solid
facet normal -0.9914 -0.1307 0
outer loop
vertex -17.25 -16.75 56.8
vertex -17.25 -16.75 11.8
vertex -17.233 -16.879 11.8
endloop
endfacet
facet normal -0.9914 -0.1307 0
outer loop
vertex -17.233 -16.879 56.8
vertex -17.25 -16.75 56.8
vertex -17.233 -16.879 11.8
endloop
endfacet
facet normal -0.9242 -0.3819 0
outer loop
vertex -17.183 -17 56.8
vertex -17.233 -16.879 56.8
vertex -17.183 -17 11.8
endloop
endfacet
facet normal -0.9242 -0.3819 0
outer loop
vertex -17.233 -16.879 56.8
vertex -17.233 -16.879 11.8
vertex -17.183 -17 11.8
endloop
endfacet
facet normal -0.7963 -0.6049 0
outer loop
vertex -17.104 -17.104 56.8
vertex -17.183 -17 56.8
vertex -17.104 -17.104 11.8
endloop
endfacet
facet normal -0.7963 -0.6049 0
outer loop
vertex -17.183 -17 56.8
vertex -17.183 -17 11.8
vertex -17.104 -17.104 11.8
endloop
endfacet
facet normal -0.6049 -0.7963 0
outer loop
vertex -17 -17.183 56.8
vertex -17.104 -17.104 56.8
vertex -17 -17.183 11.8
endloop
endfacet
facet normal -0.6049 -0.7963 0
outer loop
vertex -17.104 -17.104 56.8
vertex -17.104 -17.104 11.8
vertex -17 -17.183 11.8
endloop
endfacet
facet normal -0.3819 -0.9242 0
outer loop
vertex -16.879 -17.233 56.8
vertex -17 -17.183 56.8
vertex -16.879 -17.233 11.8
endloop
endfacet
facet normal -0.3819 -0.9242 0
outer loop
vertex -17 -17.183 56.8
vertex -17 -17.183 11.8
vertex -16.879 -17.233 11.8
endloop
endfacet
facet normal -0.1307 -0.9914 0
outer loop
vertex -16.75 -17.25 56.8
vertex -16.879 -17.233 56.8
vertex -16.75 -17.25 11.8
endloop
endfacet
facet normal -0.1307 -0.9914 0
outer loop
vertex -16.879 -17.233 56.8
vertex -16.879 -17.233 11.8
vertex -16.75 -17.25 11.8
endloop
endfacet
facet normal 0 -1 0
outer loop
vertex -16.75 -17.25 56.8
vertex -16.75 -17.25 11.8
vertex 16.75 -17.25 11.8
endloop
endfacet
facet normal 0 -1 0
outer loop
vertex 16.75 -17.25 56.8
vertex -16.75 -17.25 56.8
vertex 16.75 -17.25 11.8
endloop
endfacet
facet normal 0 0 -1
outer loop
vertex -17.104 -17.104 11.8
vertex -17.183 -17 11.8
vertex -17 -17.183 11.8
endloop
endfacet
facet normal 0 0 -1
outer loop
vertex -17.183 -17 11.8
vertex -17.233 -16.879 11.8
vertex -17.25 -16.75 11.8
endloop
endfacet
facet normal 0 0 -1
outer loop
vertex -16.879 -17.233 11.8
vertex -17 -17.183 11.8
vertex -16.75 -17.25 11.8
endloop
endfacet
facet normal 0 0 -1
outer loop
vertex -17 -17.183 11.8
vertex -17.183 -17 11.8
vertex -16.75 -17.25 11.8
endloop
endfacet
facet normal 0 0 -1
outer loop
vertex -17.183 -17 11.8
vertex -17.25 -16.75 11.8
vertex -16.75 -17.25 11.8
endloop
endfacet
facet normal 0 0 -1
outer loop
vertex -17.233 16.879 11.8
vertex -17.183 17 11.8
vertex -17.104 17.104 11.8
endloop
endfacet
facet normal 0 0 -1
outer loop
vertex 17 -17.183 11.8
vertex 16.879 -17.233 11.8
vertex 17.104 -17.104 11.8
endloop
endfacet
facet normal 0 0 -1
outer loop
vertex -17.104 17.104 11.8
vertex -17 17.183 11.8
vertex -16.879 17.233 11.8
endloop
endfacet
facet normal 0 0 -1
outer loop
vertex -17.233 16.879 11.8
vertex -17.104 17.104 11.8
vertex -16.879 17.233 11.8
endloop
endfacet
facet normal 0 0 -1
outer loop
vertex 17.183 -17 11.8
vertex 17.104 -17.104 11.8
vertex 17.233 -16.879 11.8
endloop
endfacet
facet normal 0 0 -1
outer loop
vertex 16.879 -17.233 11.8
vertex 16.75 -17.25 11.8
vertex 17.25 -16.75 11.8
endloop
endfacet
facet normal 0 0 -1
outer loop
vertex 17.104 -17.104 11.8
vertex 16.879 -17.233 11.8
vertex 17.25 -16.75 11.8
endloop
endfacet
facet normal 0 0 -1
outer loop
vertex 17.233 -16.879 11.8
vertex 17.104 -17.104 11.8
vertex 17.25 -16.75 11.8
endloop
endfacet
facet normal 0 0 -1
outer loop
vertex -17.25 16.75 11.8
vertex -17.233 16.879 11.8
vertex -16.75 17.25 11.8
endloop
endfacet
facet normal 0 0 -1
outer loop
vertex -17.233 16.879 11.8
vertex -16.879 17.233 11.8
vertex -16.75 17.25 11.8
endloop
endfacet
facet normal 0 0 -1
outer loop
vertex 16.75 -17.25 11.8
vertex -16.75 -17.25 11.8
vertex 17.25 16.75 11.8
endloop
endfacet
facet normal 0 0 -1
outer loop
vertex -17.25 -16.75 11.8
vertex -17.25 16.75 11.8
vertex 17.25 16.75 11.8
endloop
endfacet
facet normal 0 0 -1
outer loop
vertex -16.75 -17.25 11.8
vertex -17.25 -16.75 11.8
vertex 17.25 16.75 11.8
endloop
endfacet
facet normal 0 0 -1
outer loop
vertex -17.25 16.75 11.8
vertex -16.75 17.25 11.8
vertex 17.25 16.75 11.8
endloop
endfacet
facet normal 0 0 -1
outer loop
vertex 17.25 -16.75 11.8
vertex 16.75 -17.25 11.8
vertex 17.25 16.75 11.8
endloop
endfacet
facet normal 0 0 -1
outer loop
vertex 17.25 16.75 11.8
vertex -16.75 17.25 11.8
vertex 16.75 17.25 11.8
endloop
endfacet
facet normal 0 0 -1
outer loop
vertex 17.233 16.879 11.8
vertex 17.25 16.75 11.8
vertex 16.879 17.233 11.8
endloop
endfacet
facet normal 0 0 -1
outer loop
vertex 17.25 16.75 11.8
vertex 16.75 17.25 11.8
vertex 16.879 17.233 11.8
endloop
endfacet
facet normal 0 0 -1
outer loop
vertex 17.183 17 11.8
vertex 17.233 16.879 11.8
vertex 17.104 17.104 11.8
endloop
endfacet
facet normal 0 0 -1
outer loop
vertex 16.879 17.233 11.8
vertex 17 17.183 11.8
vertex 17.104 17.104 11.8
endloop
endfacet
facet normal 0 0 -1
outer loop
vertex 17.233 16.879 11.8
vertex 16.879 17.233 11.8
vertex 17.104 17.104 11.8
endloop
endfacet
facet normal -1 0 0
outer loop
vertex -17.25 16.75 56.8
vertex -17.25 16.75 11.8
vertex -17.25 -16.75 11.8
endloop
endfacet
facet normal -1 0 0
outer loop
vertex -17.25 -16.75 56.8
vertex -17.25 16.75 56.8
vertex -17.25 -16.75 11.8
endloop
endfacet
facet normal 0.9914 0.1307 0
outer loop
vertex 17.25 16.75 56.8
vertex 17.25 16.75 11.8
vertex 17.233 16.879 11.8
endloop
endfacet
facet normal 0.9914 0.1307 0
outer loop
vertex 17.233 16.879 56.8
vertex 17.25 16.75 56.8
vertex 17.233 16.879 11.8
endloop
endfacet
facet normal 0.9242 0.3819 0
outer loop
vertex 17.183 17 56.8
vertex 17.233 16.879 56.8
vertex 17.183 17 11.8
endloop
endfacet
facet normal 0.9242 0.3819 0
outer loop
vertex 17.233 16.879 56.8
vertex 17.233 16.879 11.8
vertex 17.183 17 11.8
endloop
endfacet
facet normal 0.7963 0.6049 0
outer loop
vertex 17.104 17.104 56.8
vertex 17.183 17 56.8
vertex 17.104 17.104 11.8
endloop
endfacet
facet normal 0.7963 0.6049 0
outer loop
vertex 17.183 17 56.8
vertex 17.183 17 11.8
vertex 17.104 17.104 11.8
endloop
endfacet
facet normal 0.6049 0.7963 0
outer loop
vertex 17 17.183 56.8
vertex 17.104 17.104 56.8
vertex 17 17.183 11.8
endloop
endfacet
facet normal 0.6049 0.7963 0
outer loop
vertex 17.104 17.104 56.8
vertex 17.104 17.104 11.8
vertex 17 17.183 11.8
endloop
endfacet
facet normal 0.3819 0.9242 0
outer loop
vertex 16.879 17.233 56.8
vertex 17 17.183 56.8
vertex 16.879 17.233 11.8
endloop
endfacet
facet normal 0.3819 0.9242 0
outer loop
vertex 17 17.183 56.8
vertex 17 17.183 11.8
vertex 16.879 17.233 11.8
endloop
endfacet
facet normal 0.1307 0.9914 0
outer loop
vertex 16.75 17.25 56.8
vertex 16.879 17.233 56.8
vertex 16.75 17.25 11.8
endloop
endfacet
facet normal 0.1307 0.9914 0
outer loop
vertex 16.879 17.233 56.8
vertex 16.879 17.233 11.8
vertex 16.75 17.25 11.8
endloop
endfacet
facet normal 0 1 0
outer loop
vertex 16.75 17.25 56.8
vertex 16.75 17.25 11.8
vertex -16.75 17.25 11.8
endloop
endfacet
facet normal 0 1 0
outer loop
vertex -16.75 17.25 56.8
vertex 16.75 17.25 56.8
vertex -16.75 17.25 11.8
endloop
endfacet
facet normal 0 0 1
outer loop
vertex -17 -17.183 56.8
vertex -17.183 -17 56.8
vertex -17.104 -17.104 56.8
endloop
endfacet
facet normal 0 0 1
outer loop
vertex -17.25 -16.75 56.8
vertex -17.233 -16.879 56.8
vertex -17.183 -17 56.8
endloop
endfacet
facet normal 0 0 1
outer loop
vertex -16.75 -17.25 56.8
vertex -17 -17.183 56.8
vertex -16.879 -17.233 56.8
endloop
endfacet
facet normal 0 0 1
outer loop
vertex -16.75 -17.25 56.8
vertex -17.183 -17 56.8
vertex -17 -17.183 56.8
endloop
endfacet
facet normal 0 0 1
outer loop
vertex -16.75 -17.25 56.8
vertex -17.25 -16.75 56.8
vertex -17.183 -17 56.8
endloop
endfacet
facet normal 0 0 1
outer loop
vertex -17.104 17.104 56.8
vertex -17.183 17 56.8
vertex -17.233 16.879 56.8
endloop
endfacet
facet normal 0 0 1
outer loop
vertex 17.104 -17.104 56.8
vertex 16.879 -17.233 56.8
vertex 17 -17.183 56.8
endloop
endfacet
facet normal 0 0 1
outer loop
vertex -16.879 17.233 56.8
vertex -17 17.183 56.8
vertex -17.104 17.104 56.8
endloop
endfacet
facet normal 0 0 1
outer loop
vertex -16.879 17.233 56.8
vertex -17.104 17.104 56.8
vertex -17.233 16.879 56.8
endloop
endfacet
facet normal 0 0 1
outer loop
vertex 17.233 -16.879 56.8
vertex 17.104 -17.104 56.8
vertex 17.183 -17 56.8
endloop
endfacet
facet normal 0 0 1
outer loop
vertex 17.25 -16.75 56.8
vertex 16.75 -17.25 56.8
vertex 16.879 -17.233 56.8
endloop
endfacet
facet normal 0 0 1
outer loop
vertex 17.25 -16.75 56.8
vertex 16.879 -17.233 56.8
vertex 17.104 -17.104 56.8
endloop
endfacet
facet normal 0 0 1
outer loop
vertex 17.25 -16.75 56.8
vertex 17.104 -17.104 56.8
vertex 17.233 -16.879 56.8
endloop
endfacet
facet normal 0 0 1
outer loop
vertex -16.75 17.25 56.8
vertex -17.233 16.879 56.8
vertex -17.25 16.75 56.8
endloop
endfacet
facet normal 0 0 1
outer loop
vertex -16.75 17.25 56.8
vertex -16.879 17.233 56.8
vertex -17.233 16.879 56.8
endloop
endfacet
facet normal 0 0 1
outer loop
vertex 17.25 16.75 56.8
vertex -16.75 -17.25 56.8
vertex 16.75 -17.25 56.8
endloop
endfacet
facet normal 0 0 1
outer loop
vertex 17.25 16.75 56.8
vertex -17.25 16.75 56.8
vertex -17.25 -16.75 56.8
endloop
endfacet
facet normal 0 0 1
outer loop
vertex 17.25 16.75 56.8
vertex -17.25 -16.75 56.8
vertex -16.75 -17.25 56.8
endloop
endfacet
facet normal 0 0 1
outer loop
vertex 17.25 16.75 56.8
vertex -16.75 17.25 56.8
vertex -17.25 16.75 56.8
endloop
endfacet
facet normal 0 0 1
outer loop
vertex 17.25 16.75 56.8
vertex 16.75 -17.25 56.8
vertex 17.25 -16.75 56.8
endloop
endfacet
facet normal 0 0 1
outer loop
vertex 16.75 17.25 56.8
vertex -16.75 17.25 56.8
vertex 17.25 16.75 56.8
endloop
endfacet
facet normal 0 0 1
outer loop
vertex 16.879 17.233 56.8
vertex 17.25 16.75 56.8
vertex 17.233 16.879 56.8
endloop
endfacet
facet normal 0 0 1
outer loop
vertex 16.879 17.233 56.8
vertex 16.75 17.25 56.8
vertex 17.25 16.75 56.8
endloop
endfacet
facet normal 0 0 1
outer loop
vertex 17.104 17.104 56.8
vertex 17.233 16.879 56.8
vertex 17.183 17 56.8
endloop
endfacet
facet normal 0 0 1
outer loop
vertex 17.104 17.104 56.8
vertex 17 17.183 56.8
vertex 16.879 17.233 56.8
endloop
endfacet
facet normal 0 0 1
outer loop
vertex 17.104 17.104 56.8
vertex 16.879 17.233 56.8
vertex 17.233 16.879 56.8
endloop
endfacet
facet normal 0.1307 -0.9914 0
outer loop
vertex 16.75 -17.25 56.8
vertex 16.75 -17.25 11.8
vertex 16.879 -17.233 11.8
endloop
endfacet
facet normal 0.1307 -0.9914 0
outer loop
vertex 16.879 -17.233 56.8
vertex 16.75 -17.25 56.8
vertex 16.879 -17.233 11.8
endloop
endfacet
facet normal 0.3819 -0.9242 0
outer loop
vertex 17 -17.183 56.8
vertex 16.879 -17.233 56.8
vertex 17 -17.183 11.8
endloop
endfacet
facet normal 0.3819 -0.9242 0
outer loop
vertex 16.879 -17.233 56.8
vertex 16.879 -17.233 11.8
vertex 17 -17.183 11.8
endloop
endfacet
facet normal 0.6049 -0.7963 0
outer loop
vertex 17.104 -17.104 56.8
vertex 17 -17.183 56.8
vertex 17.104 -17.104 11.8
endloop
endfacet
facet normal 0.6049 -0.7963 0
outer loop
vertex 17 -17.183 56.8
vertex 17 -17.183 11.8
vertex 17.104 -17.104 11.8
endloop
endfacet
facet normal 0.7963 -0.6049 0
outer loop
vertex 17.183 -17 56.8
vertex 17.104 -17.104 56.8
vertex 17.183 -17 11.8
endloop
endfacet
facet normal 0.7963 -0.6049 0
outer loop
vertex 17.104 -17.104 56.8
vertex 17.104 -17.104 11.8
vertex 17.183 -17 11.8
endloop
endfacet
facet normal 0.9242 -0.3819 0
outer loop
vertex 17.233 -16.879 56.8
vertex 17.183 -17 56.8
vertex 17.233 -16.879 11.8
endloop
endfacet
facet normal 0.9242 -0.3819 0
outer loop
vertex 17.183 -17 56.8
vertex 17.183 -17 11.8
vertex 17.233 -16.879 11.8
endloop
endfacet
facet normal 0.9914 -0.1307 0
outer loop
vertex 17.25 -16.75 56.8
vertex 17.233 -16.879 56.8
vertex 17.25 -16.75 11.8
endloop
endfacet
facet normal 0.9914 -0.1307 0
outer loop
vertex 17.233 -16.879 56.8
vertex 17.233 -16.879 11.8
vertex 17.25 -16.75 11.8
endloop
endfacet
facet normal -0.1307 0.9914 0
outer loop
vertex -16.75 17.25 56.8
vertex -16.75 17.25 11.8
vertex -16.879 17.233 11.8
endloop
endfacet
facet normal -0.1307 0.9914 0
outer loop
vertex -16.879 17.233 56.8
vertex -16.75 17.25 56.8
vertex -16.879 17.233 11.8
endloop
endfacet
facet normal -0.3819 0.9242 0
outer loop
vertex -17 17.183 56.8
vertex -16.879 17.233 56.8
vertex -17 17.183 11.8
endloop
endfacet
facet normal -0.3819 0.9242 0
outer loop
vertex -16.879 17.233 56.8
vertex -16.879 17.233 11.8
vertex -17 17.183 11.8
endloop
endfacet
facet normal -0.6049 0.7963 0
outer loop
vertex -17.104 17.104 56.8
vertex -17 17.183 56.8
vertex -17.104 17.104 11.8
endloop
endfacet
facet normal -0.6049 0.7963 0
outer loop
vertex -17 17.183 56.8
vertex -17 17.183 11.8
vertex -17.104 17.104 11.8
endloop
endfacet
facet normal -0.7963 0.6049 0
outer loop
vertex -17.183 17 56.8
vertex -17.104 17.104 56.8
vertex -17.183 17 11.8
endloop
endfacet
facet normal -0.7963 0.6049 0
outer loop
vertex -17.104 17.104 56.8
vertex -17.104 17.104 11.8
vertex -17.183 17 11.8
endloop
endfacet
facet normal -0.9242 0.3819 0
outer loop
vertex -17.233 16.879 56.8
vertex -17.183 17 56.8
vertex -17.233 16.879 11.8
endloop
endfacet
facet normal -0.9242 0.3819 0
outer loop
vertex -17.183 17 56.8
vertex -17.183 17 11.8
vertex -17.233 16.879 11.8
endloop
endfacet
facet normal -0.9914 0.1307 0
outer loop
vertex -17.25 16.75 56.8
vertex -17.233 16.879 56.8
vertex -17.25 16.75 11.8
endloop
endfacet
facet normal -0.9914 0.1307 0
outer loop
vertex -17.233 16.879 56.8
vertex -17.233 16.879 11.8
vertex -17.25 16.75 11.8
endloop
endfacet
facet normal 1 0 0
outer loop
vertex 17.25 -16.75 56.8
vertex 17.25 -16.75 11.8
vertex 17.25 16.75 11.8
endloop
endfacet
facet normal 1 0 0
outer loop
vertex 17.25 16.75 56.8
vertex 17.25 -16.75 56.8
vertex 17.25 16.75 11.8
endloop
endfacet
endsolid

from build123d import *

# Parameters (mm, degrees)
EXTRUDE_START     = 11.8
EXTRUDE_0_5_DEPTH = 45


with BuildPart() as part:
    # 草图1 → 连续直线装板扫掠_带0.5余量 (new body)
    with BuildSketch(Plane.XY.offset(EXTRUDE_START)):
        with BuildLine():
            Line((-16.75, -17.25), (16.75, -17.25))
            ThreePointArc((16.75, -17.25), (17.103553391, -17.103553391), (17.25, -16.75))
            Line((17.25, -16.75), (17.25, 16.75))
            ThreePointArc((17.25, 16.75), (17.103553391, 17.103553391), (16.75, 17.25))
            Line((16.75, 17.25), (-16.75, 17.25))
            ThreePointArc((-16.75, 17.25), (-17.103553391, 17.103553391), (-17.25, 16.75))
            Line((-17.25, 16.75), (-17.25, -16.75))
            ThreePointArc((-17.25, -16.75), (-17.103553391, -17.103553391), (-16.75, -17.25))
        make_face()
    extrude(amount=EXTRUDE_0_5_DEPTH)


solid = part.part
